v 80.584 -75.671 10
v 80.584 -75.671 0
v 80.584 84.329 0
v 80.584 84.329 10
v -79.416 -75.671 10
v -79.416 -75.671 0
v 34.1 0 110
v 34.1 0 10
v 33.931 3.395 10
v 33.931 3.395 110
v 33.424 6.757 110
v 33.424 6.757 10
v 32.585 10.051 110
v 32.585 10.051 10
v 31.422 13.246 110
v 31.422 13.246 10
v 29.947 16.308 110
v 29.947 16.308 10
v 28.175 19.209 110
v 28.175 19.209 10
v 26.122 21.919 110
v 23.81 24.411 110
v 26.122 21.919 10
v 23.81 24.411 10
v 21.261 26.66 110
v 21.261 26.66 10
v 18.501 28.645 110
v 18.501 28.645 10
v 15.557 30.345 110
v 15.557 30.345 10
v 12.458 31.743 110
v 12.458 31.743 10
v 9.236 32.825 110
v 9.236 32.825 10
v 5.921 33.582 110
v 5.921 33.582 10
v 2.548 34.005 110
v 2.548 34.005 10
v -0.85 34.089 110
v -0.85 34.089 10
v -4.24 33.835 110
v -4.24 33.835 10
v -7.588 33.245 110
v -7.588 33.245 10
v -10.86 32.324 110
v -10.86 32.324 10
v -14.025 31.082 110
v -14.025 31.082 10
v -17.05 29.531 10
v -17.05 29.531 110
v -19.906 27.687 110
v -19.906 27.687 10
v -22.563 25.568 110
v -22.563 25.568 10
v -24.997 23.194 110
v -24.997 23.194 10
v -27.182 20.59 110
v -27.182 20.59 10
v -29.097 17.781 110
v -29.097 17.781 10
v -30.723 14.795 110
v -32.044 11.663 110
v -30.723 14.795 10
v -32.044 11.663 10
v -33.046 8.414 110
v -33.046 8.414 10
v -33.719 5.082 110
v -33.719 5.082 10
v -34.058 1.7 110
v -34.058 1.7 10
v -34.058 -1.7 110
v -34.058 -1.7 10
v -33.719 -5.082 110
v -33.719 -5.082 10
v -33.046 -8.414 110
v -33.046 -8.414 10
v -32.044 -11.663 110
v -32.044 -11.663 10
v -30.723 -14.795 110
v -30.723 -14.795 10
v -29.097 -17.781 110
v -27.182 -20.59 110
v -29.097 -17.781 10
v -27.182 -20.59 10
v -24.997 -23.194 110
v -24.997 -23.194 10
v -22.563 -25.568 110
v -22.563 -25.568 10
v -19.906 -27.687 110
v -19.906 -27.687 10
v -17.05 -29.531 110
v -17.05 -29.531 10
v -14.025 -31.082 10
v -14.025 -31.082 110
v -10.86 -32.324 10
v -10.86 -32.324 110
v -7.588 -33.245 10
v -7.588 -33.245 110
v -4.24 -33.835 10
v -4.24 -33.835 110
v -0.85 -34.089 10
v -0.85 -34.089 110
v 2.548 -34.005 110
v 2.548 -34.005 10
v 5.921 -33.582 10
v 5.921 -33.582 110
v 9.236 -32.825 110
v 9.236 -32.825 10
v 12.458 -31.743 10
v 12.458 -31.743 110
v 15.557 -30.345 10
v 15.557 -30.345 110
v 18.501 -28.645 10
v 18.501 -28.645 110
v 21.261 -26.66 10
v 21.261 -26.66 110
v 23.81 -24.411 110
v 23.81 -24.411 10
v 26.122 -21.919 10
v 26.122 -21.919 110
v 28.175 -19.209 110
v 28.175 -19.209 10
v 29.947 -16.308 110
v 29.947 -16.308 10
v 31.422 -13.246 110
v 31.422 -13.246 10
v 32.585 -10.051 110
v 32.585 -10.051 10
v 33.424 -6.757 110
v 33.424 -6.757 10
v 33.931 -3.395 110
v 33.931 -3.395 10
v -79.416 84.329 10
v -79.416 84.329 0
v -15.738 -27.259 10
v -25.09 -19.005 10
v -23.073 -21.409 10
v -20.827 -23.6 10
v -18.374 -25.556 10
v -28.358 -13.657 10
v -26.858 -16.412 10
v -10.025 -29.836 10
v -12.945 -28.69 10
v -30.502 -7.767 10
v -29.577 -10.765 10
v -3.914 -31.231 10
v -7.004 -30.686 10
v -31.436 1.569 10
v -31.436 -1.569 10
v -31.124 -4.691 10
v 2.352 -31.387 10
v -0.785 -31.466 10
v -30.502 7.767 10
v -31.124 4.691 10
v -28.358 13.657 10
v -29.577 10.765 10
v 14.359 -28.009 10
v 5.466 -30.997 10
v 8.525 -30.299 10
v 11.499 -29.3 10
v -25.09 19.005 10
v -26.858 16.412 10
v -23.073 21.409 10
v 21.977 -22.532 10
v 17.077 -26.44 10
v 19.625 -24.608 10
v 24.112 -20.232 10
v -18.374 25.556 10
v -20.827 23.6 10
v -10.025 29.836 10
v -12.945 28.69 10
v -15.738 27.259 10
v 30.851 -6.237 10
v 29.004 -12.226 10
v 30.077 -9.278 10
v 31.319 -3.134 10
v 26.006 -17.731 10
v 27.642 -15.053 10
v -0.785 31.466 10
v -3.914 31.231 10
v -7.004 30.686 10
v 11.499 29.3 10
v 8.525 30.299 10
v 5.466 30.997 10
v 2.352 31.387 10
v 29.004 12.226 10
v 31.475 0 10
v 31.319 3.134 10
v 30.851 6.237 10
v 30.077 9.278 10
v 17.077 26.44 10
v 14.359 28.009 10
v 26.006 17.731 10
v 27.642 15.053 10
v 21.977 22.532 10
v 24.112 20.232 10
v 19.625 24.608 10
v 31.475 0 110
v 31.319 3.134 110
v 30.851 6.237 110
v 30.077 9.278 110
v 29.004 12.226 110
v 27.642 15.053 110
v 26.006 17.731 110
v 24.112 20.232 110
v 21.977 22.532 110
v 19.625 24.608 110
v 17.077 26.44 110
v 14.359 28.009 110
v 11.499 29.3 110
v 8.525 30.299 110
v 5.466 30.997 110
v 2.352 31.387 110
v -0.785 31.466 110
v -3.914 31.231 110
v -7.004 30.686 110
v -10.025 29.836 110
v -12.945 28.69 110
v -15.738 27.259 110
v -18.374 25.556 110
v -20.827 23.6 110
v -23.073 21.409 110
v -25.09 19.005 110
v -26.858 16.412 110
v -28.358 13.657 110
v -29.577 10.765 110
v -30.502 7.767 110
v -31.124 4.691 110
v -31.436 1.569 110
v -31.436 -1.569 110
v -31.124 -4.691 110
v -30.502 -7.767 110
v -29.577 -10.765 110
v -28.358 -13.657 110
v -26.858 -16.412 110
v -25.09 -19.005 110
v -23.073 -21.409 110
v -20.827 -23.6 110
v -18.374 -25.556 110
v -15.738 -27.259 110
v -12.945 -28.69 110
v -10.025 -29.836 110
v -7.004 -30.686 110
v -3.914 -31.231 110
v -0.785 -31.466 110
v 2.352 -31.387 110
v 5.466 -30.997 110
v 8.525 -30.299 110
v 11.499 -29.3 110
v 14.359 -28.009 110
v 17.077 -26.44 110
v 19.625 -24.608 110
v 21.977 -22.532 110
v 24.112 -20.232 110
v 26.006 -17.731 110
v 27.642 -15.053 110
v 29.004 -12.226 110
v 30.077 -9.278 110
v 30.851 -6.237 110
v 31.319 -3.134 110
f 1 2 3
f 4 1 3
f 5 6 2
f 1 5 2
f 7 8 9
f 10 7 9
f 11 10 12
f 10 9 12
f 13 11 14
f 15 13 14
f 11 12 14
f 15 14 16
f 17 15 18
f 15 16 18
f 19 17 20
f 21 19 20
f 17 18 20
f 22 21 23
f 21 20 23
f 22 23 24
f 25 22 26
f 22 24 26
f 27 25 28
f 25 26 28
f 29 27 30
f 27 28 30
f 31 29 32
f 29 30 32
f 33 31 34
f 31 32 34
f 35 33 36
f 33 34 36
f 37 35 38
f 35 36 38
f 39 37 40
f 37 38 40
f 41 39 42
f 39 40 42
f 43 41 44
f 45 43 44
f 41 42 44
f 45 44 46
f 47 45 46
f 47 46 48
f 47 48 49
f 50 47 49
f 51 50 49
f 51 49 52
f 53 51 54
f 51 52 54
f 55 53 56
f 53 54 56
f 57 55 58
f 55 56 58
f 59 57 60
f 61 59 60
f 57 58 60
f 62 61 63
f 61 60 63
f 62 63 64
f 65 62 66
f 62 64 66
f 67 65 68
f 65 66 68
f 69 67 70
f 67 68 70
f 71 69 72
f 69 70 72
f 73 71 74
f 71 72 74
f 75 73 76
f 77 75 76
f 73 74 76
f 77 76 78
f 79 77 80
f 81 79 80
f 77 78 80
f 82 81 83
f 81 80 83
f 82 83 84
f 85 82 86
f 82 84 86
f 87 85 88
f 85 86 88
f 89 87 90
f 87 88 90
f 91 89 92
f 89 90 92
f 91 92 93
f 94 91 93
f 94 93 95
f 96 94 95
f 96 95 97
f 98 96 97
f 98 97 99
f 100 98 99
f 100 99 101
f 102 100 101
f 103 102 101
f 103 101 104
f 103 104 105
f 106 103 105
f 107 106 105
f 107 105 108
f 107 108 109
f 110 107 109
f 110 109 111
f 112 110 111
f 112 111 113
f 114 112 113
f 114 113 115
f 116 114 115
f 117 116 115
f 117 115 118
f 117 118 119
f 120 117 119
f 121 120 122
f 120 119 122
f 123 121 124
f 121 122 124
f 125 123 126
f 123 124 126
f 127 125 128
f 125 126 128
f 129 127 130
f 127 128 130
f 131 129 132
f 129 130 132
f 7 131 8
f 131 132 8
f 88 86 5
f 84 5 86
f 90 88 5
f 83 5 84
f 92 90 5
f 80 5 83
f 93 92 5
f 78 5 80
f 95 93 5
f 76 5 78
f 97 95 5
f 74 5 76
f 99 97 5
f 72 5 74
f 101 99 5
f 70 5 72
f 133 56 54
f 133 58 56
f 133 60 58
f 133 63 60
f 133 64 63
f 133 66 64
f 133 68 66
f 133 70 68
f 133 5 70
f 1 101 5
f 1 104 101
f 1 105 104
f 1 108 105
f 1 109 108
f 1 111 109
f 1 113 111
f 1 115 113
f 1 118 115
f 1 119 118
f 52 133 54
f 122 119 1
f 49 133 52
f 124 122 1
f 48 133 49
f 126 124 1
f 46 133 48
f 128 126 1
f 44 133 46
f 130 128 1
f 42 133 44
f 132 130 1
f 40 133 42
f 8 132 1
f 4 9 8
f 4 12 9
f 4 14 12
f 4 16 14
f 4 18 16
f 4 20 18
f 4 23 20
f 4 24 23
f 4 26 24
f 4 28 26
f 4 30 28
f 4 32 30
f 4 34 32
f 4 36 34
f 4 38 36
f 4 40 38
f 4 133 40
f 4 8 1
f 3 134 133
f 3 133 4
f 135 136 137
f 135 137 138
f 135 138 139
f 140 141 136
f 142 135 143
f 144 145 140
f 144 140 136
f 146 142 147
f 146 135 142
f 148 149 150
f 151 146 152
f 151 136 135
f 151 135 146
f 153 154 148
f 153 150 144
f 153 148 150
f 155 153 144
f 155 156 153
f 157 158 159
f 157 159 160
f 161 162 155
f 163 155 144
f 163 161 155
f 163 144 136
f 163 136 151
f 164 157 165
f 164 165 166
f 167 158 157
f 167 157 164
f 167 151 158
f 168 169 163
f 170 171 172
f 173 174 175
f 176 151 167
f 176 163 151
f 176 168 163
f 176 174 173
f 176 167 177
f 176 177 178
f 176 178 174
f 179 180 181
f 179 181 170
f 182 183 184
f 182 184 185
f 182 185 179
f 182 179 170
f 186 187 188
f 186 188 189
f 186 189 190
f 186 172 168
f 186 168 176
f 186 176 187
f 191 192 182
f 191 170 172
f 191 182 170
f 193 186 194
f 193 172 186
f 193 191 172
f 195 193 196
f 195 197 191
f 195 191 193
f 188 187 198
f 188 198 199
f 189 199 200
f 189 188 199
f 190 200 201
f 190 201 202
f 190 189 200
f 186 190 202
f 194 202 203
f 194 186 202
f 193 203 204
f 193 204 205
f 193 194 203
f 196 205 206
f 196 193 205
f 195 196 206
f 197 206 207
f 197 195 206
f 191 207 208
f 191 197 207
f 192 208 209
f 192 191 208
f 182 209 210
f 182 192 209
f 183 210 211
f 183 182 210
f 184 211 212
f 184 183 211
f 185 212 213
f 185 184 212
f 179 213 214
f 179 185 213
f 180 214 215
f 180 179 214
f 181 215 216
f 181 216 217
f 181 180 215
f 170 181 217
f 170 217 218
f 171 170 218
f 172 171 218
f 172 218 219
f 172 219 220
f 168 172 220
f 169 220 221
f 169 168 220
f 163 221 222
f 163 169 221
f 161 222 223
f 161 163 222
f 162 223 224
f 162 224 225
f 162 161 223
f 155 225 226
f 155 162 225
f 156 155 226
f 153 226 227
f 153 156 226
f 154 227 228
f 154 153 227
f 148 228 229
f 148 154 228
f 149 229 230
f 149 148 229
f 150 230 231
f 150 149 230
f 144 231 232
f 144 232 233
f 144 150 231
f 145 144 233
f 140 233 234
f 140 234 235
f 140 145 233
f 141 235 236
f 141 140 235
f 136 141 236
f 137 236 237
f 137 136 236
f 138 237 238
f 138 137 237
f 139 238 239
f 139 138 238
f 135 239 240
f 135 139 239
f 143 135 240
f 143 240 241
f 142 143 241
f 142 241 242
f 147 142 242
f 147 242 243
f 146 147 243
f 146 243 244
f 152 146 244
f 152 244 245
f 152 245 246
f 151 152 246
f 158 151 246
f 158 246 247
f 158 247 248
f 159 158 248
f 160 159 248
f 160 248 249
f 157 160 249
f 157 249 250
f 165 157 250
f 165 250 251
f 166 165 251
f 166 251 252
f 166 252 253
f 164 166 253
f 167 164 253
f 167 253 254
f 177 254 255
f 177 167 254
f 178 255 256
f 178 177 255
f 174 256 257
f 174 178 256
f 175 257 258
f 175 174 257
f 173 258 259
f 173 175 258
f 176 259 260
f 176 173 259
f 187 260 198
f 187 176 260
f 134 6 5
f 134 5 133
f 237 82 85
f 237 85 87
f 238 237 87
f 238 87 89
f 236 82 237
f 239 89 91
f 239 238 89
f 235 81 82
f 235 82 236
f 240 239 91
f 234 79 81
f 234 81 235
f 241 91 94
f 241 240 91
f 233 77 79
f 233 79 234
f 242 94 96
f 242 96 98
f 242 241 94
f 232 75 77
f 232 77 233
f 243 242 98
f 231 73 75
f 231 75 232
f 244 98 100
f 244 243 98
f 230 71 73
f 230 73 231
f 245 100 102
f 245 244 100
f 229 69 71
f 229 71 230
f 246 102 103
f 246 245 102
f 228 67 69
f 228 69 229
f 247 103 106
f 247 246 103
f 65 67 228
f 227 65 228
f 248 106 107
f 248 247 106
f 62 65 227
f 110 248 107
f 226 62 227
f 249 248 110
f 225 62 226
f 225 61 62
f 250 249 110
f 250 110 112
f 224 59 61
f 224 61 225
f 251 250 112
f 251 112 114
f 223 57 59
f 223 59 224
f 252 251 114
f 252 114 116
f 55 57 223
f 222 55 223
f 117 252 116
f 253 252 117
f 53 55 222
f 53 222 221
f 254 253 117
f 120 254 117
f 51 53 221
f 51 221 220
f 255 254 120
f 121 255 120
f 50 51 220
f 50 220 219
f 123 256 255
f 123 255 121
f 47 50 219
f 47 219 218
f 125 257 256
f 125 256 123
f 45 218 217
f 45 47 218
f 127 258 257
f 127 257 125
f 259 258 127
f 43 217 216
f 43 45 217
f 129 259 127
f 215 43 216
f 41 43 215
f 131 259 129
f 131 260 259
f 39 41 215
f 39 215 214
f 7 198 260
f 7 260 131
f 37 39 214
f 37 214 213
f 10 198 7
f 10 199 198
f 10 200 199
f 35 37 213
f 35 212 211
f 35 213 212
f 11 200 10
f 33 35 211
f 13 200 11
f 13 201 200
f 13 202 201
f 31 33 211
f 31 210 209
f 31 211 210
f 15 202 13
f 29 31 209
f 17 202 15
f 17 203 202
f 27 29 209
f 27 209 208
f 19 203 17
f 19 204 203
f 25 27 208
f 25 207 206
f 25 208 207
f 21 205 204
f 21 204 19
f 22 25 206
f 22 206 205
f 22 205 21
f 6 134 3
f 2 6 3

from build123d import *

# Parameters (mm, degrees)
SKETCH010_W   = 160
SKETCH010_H   = 160
PAD009_DEPTH  = 10
SKETCH011_R   = 34.1
SKETCH011_R_2 = 31.475436
PAD010_DEPTH  = 100


with BuildPart() as body011:
    # Sketch010 (on Face1 of CopyBoolean001) → Pad009 (new body)
    with BuildSketch(Plane.XY):
        with Locations((0.584024, 4.328783)):
            Rectangle(SKETCH010_W, SKETCH010_H)
    extrude(amount=PAD009_DEPTH)


with BuildPart() as motoradapter:
    # Sketch011 (on Face1 of CopyPad009) → Pad010 (new body)
    with BuildSketch(Plane.XY.offset(10)):
        Circle(SKETCH011_R)
        Circle(SKETCH011_R_2, mode=Mode.SUBTRACT)
    extrude(amount=PAD010_DEPTH)

    # Boolean002: union Body011
    add(body011.part)


solid = motoradapter.part
